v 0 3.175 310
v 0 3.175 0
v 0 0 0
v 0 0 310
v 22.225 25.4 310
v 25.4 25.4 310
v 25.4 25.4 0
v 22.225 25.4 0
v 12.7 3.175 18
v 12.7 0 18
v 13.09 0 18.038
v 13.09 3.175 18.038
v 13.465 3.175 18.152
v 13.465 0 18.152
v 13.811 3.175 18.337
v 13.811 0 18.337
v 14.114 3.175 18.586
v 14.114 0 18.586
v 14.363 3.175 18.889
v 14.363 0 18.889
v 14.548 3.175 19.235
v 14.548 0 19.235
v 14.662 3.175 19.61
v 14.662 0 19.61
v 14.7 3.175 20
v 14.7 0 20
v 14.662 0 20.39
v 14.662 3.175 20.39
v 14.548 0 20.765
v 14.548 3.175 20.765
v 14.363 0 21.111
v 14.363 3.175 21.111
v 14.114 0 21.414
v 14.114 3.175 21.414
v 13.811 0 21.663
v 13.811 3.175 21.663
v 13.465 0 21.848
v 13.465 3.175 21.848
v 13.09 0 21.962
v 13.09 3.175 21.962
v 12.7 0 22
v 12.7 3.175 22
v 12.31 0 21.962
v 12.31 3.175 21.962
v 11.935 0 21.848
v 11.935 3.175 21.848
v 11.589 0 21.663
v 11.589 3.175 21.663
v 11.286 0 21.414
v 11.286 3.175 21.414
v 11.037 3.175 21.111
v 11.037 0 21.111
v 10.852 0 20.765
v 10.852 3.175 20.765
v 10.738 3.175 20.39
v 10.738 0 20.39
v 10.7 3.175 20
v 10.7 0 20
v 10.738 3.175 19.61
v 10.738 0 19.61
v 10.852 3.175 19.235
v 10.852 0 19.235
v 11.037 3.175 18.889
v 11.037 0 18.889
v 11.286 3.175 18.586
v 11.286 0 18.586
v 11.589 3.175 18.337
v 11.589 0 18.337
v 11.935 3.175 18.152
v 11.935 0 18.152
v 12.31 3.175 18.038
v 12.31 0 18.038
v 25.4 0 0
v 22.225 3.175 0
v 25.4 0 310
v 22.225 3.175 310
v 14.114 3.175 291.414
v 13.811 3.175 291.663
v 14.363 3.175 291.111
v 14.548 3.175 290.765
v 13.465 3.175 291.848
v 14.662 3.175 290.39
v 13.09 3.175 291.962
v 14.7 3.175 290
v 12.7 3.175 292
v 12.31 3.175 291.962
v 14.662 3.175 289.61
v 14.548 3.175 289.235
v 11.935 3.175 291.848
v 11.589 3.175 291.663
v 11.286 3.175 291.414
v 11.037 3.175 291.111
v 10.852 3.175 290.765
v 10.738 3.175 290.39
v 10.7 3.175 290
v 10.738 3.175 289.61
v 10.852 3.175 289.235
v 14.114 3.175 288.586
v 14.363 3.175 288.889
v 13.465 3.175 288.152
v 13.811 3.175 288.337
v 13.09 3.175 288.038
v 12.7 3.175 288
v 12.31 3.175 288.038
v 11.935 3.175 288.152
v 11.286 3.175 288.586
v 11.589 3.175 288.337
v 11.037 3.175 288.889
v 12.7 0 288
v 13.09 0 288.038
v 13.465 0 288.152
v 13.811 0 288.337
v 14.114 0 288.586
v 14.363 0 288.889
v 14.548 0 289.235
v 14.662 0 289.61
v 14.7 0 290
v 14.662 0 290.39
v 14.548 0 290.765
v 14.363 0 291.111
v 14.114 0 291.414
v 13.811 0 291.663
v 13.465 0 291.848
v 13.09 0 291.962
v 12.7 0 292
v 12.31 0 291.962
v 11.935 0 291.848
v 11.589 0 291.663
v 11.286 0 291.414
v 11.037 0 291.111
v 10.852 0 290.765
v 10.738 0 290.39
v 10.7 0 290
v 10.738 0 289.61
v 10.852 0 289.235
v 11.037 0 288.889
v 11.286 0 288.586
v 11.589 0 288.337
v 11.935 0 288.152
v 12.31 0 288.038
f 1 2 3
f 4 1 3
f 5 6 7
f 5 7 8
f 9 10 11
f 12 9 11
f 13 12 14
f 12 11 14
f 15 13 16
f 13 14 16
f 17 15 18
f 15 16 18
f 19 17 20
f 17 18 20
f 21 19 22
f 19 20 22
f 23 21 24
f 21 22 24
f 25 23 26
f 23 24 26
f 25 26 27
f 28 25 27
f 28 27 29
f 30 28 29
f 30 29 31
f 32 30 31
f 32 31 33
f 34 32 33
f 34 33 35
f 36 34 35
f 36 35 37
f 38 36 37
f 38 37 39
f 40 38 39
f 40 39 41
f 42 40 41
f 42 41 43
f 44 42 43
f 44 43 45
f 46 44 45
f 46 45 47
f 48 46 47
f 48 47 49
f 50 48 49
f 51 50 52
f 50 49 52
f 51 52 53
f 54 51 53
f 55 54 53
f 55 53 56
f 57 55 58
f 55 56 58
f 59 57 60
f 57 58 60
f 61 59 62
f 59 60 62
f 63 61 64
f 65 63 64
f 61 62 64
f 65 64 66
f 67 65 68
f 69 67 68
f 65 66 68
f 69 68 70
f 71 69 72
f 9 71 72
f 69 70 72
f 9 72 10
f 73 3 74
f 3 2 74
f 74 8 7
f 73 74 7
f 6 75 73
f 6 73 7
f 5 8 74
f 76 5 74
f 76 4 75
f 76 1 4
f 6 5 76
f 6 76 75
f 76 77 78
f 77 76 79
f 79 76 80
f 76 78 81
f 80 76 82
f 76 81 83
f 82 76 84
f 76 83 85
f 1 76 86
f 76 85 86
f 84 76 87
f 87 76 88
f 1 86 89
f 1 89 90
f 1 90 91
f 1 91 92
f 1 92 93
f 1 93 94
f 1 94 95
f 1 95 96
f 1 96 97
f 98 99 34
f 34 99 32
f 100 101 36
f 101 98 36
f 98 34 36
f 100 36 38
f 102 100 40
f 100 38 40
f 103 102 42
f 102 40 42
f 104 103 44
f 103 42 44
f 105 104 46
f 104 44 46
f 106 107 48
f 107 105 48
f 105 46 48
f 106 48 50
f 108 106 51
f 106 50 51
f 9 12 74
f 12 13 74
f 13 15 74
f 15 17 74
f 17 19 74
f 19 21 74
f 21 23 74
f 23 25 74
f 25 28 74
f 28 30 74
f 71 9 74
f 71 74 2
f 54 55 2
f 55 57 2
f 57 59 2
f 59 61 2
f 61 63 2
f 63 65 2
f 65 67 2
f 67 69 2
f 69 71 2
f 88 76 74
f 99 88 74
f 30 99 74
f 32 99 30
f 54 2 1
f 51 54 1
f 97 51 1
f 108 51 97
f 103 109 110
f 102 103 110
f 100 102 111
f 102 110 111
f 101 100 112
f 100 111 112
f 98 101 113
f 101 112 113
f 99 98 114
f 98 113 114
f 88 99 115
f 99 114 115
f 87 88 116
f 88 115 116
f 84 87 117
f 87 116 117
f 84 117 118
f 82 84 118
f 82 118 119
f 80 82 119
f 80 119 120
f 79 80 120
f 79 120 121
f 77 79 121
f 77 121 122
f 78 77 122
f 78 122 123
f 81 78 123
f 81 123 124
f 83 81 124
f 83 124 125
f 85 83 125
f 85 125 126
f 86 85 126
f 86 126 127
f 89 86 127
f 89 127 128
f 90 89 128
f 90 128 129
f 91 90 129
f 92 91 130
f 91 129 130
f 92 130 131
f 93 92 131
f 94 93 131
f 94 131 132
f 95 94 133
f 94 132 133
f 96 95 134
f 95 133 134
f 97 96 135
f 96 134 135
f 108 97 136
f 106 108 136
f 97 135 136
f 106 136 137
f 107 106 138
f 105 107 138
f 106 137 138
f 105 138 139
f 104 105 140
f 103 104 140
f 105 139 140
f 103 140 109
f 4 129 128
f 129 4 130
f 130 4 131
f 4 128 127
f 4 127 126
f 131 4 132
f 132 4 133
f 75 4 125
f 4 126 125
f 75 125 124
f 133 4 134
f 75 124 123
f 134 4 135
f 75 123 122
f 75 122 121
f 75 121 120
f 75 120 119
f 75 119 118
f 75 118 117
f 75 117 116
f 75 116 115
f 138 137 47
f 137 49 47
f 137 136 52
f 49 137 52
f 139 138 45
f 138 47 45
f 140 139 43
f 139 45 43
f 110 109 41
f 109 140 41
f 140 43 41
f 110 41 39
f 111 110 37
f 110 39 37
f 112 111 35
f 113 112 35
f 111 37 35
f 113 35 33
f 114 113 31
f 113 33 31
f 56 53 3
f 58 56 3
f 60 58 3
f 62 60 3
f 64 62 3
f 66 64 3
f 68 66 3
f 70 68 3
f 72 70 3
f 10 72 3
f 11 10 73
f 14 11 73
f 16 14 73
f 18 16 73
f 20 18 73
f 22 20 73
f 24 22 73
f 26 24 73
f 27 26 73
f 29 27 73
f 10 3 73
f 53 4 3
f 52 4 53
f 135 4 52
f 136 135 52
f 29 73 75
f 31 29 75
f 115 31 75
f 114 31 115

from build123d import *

# Parameters (mm, degrees)
BOSS_EXTRUDE1_DEPTH = 310
SKETCH2_R           = 2
CUT_EXTRUDE1_DEPTH  = 310


with BuildPart() as part:
    # Sketch1 → Boss-Extrude1 (new body)
    with BuildSketch(Plane.XY):
        Polygon((0, 0), (25.4, 0), (25.4, 25.4), (22.225, 25.4), (22.225, 3.175), (0, 3.175), align=None)
    extrude(amount=BOSS_EXTRUDE1_DEPTH)

    # Sketch2 → Cut-Extrude1 (cut)
    with BuildSketch(Plane.XZ):
        with Locations(Location((12.7, 290, 0), (0, 0, 270))):
            Circle(SKETCH2_R)
        with Locations(Location((12.7, 20, 0), (0, 0, 270))):
            Circle(SKETCH2_R)
    extrude(amount=-CUT_EXTRUDE1_DEPTH, mode=Mode.SUBTRACT)


solid = part.part
